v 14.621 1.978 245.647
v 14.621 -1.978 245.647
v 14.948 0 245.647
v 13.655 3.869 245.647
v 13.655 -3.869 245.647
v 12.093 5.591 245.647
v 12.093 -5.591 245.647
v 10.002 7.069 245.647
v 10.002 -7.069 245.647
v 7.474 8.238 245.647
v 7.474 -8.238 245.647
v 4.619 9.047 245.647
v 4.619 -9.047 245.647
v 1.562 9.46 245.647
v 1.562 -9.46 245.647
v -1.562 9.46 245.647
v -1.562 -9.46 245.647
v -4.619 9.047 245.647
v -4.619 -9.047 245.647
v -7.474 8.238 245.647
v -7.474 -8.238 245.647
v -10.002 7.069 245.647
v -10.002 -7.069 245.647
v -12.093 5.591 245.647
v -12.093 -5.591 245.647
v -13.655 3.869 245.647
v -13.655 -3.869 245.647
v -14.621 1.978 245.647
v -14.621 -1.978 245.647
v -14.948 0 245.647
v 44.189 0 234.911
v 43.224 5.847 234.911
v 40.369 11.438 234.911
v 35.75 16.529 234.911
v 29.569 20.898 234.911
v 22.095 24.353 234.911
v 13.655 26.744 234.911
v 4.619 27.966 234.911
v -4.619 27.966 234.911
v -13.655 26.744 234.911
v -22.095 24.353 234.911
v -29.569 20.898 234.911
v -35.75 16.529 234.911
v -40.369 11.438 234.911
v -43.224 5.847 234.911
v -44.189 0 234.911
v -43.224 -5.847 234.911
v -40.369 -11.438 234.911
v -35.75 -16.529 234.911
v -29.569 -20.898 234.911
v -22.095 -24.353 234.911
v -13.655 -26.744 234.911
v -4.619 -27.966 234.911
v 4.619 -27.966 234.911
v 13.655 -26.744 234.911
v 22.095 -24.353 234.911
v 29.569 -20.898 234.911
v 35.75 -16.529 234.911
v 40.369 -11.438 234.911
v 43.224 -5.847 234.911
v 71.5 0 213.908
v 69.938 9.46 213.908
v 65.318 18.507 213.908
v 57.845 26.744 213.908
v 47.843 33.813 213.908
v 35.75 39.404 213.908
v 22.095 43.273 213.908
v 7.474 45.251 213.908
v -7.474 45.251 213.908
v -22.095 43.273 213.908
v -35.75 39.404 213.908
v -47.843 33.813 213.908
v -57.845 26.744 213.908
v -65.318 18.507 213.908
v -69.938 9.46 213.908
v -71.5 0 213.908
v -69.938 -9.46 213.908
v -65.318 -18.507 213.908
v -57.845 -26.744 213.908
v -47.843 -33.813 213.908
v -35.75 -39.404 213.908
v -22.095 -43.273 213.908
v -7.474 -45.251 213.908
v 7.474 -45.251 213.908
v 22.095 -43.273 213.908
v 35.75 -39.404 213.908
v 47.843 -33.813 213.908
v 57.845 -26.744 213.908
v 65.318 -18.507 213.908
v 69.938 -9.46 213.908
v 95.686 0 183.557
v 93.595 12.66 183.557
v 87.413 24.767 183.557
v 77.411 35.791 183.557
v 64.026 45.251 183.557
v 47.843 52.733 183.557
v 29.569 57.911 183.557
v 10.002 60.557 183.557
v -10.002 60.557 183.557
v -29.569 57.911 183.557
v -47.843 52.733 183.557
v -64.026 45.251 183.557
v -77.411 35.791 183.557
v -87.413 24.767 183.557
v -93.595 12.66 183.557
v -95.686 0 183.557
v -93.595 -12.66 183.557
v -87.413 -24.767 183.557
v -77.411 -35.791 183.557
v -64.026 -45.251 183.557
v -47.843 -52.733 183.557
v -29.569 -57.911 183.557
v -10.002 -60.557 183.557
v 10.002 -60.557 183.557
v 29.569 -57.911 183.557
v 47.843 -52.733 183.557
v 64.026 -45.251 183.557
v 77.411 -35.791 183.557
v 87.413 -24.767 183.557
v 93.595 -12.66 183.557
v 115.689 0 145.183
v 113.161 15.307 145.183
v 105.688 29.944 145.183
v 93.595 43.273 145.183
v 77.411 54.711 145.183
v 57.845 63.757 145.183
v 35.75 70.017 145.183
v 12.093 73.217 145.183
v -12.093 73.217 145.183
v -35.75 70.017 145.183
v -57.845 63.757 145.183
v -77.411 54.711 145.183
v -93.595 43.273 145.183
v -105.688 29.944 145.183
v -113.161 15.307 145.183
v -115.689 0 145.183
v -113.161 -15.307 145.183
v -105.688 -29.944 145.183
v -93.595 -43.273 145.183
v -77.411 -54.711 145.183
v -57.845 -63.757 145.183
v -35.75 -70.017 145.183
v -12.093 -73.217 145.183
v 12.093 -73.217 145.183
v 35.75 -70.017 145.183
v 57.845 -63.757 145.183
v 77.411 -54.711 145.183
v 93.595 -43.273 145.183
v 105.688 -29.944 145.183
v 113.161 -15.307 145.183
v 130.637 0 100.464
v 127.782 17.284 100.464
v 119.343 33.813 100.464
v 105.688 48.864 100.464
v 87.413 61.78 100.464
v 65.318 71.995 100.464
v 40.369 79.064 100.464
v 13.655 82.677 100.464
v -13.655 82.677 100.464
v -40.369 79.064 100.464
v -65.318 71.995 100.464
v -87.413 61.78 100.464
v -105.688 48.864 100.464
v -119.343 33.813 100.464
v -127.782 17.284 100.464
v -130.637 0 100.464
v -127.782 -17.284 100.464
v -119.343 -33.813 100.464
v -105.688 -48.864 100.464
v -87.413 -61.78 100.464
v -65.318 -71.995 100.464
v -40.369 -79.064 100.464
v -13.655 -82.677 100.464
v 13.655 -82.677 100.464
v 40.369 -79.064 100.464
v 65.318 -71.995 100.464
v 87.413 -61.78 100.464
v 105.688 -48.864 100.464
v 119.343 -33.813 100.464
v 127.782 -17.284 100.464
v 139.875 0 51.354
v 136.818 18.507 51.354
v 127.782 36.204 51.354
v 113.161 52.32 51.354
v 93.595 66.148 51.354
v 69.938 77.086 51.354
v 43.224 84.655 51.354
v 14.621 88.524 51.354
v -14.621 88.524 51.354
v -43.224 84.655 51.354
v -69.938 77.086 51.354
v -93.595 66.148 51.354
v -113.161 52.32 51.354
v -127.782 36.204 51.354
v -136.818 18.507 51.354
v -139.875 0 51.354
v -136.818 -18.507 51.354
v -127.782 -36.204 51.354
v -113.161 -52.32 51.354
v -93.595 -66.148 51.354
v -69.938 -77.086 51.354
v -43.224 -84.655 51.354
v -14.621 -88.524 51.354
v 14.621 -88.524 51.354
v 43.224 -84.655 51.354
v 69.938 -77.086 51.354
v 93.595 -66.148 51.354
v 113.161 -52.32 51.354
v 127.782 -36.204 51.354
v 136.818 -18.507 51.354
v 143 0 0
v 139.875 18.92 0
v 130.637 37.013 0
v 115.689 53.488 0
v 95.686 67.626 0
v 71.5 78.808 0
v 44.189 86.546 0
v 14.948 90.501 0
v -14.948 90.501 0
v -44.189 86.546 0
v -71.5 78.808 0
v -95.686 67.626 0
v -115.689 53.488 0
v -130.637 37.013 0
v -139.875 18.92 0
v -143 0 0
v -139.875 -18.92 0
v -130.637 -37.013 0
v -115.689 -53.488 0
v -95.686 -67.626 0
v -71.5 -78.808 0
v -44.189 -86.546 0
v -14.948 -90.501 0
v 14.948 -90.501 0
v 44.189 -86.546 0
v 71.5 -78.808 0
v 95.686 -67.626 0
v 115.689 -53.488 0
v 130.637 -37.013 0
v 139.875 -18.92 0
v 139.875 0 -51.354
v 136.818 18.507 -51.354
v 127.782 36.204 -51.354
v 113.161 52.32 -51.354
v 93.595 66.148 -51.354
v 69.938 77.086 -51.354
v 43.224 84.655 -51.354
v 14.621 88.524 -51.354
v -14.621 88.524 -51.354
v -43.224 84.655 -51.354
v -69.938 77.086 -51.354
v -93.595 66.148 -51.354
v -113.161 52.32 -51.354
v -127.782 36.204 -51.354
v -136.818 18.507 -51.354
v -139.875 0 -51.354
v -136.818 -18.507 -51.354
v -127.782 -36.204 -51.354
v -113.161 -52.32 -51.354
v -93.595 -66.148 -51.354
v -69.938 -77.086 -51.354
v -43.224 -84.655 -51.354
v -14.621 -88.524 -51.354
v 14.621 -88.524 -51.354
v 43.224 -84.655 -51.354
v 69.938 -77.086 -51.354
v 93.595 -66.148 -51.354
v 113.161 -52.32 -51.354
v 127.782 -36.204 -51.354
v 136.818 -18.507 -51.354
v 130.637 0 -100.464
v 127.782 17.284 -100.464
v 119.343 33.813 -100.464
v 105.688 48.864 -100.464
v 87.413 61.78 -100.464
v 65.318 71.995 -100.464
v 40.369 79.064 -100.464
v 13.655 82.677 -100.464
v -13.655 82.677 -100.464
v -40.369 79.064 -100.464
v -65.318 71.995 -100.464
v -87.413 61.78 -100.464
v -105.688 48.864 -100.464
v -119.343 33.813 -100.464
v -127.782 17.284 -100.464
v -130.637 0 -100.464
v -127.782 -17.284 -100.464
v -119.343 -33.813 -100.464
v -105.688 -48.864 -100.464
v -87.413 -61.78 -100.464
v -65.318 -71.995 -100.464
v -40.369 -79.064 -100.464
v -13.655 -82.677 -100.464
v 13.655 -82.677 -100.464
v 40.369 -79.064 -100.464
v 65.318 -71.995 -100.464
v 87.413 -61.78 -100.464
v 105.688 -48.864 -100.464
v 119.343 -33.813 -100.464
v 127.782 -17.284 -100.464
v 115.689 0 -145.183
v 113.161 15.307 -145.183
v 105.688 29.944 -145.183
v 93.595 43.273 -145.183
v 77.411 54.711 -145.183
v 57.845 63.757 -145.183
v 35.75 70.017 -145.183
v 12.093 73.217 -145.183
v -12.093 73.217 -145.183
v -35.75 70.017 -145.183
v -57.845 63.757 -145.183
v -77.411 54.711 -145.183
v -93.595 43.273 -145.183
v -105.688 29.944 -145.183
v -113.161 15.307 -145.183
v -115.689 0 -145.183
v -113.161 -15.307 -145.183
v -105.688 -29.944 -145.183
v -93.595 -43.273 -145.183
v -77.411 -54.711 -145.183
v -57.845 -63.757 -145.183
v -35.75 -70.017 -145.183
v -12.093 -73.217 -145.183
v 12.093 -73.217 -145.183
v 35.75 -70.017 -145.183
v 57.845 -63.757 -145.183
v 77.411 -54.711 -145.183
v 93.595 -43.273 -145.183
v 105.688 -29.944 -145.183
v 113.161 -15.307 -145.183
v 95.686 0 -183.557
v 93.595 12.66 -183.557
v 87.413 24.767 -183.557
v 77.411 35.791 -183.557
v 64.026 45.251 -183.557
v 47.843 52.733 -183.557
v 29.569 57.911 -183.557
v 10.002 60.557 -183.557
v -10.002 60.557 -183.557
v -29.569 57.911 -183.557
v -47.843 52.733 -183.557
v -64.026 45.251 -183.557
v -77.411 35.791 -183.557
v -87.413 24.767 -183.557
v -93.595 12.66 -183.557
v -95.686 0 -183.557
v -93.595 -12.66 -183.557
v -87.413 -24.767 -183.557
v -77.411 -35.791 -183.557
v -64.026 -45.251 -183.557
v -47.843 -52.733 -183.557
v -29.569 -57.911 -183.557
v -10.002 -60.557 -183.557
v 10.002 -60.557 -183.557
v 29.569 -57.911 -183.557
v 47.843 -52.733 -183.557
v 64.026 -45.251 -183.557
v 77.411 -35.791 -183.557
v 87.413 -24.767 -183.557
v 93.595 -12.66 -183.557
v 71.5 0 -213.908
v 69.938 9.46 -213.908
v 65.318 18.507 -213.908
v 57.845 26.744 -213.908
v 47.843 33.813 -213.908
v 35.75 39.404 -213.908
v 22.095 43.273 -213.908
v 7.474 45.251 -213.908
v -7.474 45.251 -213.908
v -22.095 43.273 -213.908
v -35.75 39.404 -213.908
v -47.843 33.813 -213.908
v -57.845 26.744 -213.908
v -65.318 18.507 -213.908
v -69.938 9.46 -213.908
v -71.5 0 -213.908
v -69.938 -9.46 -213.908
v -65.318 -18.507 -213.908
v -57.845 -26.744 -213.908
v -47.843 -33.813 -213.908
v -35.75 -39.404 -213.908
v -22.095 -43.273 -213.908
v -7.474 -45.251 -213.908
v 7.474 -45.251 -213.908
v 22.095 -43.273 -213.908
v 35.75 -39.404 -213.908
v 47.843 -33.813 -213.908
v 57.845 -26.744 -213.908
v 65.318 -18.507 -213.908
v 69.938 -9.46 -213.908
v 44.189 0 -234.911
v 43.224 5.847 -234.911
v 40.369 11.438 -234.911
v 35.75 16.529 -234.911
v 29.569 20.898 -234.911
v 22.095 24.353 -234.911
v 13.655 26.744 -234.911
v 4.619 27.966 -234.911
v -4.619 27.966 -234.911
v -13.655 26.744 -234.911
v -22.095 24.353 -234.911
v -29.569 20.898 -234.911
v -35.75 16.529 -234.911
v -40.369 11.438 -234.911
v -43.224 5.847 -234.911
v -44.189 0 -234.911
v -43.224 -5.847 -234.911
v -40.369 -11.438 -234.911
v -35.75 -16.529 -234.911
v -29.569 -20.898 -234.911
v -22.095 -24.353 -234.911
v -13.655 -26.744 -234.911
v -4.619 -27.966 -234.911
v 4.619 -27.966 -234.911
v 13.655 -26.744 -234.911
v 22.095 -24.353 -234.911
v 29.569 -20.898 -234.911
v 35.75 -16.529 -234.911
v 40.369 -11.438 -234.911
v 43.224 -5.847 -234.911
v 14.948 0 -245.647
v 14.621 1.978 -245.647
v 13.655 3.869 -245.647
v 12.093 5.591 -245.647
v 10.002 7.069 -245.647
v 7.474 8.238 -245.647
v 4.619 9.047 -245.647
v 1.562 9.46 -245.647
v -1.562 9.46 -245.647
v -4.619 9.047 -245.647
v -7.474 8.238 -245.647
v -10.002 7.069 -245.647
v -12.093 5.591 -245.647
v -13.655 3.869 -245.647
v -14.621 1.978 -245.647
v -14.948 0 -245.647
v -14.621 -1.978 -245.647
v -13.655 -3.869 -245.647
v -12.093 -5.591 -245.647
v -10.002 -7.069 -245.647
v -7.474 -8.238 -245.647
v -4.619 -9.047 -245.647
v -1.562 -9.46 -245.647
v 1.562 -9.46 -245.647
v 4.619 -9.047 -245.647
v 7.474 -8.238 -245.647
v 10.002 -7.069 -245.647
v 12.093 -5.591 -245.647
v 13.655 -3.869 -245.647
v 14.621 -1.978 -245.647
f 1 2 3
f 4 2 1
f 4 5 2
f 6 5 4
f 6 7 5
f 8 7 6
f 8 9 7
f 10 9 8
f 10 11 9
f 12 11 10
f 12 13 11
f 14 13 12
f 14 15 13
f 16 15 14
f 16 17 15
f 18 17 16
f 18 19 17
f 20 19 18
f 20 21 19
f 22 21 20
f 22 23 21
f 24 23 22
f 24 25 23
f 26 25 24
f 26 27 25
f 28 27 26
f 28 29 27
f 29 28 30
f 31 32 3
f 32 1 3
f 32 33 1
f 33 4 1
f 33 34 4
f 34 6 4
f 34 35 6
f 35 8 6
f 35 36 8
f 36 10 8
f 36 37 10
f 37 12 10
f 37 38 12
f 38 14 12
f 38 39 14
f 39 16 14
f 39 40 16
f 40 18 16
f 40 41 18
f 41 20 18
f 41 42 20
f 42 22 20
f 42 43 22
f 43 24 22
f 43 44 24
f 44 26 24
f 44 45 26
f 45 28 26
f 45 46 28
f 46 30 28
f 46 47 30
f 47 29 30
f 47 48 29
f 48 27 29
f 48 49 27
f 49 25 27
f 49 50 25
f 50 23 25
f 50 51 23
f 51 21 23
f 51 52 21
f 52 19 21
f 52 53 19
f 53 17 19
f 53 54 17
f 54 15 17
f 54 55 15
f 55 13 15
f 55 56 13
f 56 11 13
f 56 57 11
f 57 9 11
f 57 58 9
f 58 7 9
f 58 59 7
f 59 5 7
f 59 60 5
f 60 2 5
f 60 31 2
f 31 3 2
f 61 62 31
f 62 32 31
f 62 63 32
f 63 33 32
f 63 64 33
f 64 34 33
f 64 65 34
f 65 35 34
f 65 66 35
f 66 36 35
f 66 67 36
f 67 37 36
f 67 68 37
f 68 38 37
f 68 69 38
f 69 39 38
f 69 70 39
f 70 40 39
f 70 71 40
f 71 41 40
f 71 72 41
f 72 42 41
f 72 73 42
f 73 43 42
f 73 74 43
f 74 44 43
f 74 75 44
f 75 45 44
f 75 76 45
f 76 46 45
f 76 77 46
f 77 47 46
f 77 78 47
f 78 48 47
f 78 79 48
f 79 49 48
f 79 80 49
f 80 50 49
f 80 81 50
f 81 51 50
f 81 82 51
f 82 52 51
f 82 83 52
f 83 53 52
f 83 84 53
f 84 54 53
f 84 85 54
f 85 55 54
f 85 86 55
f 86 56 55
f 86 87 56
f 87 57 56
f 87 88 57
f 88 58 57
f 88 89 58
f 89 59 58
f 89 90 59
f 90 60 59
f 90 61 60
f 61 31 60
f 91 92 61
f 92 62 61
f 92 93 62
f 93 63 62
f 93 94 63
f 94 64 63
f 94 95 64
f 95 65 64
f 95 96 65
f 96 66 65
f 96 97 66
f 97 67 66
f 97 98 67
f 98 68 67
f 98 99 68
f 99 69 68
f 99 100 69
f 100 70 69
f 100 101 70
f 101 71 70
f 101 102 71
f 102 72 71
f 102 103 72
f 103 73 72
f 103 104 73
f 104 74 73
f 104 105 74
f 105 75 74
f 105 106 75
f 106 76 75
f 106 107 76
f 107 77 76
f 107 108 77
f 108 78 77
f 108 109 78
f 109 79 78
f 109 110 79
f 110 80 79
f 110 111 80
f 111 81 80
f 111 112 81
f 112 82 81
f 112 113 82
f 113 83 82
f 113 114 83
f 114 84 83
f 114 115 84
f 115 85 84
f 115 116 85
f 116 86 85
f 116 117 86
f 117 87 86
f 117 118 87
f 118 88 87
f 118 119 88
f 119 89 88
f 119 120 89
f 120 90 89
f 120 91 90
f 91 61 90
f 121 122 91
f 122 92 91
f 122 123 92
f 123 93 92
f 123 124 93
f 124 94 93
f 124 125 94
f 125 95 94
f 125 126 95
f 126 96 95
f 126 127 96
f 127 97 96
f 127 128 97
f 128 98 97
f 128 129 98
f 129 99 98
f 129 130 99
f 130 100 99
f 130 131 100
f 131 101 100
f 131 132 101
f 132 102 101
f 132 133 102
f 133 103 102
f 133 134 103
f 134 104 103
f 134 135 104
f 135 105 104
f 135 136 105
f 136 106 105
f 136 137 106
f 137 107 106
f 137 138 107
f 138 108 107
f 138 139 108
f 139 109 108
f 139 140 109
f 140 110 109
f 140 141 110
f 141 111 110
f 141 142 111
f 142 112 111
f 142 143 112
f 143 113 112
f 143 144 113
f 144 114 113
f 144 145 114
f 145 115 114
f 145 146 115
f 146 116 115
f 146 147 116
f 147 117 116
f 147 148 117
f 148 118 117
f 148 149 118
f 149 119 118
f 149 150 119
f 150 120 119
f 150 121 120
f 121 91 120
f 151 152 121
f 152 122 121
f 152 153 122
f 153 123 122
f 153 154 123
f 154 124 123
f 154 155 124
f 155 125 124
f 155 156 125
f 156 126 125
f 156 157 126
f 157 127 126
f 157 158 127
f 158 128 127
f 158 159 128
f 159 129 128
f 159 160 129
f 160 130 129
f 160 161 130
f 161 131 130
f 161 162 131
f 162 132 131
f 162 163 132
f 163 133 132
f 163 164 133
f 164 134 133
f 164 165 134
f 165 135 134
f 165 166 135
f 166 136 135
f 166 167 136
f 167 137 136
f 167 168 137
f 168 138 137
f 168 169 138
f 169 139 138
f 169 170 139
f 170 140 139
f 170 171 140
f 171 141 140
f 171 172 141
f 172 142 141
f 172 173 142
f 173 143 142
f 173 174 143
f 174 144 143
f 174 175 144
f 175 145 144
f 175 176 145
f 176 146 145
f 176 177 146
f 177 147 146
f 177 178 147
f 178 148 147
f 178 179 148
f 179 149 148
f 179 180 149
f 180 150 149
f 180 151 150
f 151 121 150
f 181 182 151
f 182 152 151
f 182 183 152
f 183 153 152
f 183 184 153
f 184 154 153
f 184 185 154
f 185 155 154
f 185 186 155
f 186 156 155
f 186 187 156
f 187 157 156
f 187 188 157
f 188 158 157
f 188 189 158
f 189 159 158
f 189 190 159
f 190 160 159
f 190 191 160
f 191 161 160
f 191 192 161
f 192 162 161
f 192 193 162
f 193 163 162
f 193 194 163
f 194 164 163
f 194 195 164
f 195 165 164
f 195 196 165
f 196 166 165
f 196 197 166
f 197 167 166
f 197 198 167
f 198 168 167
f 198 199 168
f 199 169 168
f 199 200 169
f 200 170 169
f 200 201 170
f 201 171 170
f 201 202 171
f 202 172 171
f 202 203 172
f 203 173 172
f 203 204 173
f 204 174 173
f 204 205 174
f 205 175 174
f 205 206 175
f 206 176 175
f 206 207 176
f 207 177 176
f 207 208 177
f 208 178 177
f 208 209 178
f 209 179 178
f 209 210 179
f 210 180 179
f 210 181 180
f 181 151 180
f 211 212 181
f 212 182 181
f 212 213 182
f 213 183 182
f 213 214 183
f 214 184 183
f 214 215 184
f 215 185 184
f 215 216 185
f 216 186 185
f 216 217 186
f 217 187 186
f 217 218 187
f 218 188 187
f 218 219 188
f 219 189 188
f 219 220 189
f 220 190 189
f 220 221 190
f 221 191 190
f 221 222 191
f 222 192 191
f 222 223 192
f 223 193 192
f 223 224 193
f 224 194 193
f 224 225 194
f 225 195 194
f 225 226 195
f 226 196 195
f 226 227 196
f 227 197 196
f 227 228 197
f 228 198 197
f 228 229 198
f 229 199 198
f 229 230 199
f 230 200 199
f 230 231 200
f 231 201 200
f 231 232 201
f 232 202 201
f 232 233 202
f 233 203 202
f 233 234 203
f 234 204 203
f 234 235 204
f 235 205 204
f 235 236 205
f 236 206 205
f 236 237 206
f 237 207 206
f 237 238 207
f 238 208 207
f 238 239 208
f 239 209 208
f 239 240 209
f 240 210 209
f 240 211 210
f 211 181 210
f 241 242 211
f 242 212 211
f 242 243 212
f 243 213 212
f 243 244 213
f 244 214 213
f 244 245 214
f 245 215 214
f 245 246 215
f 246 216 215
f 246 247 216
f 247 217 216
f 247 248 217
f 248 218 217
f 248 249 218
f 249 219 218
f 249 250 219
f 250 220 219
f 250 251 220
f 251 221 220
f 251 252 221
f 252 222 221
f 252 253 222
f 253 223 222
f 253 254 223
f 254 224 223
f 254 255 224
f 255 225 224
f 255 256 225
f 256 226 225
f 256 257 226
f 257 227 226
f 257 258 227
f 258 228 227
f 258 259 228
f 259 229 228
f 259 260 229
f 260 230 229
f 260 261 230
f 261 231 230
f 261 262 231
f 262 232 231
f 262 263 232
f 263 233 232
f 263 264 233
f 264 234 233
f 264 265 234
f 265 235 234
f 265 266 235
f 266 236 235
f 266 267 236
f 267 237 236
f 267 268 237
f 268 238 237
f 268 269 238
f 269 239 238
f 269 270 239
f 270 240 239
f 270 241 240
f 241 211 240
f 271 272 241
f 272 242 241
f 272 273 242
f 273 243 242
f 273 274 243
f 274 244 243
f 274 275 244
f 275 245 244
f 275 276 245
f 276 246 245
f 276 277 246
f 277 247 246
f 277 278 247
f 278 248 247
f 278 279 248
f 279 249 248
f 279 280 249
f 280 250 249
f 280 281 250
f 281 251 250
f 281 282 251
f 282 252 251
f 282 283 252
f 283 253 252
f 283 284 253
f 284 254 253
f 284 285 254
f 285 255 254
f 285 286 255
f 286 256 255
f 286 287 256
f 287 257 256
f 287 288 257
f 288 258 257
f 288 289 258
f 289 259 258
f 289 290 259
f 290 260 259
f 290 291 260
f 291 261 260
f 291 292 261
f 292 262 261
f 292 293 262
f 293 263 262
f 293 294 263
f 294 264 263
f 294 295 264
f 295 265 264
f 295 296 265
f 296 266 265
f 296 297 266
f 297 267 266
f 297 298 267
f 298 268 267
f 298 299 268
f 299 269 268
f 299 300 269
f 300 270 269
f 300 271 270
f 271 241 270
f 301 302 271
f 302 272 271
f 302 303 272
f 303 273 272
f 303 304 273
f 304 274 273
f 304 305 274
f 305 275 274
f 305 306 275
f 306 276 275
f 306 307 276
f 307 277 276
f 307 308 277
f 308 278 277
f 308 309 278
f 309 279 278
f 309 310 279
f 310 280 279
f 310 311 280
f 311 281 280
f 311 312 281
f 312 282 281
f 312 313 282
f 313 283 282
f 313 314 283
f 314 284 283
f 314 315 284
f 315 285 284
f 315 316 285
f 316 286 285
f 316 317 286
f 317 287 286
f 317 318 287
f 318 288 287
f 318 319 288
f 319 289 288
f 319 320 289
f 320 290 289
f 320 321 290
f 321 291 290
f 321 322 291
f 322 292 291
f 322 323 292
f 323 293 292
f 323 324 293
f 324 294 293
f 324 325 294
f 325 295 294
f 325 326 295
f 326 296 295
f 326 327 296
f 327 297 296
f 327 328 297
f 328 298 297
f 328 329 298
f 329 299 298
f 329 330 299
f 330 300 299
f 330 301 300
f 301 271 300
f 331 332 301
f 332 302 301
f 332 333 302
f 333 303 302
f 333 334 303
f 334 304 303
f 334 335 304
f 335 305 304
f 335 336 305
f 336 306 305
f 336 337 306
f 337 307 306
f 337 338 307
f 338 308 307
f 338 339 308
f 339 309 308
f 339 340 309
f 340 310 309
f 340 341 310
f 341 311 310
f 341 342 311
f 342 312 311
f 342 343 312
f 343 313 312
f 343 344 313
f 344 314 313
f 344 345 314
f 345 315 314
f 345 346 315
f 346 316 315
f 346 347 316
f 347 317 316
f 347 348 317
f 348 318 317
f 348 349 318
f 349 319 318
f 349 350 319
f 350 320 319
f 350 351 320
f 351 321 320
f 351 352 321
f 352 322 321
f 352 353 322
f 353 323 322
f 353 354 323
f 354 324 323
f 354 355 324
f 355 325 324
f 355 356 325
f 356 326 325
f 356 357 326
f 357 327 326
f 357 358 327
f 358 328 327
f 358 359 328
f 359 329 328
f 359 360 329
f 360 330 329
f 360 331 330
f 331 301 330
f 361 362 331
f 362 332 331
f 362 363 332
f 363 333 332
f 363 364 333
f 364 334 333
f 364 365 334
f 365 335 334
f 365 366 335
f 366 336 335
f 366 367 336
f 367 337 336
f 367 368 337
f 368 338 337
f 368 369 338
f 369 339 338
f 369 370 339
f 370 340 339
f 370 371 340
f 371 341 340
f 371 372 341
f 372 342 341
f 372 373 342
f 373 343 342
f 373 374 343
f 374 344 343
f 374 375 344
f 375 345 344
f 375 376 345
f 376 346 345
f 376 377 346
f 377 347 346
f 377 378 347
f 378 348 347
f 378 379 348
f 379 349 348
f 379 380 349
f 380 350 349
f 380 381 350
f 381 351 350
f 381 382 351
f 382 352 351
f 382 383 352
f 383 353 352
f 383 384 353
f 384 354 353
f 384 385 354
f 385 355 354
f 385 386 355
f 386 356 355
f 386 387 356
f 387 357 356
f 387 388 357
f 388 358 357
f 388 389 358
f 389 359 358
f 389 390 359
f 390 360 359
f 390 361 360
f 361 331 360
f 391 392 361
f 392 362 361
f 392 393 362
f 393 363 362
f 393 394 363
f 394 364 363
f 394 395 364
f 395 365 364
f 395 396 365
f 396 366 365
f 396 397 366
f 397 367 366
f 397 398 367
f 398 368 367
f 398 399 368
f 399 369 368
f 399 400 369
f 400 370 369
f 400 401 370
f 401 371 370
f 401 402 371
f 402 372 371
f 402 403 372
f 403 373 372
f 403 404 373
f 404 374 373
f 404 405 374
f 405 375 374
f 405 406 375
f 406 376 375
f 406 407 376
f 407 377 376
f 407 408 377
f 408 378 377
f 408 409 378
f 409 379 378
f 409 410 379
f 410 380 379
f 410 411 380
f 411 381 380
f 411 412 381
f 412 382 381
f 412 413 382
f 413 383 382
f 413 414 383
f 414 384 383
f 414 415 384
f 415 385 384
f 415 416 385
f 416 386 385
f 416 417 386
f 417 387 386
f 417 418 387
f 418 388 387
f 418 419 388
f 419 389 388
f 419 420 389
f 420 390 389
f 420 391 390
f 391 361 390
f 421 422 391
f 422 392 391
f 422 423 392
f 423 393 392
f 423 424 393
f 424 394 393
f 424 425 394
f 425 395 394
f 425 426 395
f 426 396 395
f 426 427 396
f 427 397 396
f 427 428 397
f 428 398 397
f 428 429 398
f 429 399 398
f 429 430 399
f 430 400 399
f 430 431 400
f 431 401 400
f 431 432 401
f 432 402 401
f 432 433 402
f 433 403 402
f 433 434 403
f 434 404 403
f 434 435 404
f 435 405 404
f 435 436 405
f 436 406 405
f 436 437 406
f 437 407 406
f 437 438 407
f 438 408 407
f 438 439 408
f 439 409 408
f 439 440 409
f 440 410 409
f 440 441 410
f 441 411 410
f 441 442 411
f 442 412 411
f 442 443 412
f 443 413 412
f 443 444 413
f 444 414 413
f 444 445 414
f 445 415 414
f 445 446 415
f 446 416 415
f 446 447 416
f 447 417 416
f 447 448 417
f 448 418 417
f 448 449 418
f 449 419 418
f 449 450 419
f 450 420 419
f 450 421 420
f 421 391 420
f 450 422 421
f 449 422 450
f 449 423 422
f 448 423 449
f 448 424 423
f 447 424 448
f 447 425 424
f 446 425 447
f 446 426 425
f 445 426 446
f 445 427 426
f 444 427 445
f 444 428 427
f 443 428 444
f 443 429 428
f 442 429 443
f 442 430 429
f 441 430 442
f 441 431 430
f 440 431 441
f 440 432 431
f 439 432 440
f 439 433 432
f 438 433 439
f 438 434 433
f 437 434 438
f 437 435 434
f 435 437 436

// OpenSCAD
// Generated by SolidPython 1.0.1 on 2020-07-29 00:46:49


scale(v = [11, 7, 19]) {
	sphere(r = 13);
}
/***********************************************
*********      SolidPython code:      **********
************************************************
 
# import packages: SolidPython
from solid import *
from solid.utils import *
from itertools import chain, combinations, permutations


class Resize:

    def __init__(self, scad_file):
        self.scad_file = scad_file
        #self.scad_file = import_scad(scad_file)
        # cone/cylinder param:
        self.r1 = 0
        self.r2 = 0
        self.h = 0
        # rectangular prism param:
        self.w = 0
        self.l = 0
        # ellipse param:
        self.r = 0

    # import OpenScad code (file name corresponds to shape)


    # classify shape + parameters
    def assign(self, param1, param2, param3):
        if self.scad_file == 'cone.scad':
            self.r1 = param1
            self.r2 = param2
            self.h = param3
        elif self.scad_file == 'cylinder.scad':
            self.r1 = param1
            self.r2 = param2
            self.h = param3
        elif self.scad_file == 'rectangularPrism.scad':
            self.h = param1
            self.l = param2
            self.w = param3
        else:
            self.r = param1
            self.h = param2

    # resize parameters
    def iterate(self):
        x = range(3, 20, 2)
        i = 1
        if self.scad_file == 'cone.scad':
            tempList = list(permutations(x, 2))
            for temp in tempList:
                param1 = temp[0]
                param2 = temp[1]
                filepath = 'produced_scad_files/' + 'cone' + str(param1) + '_' + str(param2) + '_' + '.scad'
                scad_render_to_file(cylinder(h=param1, r1=param2, r2=0), filepath)

        elif self.scad_file == 'cylinder.scad':
            tempList = list(permutations(x, 3))
            for temp in tempList:
                param1 = temp[0]
                param2 = temp[1]
                filepath = 'produced_scad_files/' + 'cylinder' + str(param1) + '_' + str(param2) + '_' + '.scad'
                scad_render_to_file(cylinder(h=param1, r1=param2, r2=param2), filepath)

        elif self.scad_file == 'rectangularPrism.scad':
            tempList = list(permutations(x, 3))
            for temp in tempList:
                param1 = temp[0]
                param2 = temp[1]
                param3 = temp[2]
                filepath = 'produced_scad_files/' + 'rectangularPrism' + str(param1) + '_' + str(param2) + '_' + str(
                    param3) + '.scad'
                scad_render_to_file(cube(size=(param1, param2, param3)), filepath)

        elif self.scad_file == 'ellipse.scad':
            tempList = list(permutations(x, 4))
            for temp in tempList:
                param1 = temp[0]
                param2 = temp[1]
                param3 = temp[2]
                param4 = temp[3]
                filepath = 'produced_scad_files/' + 'ellipse' + str(param1) + '_' + str(param2) + '_' + str(param3) + '_' + str(param4) + '.scad'
                scad_render_to_file(scale([param1, param2, param3])(sphere(r=param4)), filepath)

    def render_to_scadfile(self):
        scad_render_to_file(scad, 'example.scad') 
 
************************************************/
